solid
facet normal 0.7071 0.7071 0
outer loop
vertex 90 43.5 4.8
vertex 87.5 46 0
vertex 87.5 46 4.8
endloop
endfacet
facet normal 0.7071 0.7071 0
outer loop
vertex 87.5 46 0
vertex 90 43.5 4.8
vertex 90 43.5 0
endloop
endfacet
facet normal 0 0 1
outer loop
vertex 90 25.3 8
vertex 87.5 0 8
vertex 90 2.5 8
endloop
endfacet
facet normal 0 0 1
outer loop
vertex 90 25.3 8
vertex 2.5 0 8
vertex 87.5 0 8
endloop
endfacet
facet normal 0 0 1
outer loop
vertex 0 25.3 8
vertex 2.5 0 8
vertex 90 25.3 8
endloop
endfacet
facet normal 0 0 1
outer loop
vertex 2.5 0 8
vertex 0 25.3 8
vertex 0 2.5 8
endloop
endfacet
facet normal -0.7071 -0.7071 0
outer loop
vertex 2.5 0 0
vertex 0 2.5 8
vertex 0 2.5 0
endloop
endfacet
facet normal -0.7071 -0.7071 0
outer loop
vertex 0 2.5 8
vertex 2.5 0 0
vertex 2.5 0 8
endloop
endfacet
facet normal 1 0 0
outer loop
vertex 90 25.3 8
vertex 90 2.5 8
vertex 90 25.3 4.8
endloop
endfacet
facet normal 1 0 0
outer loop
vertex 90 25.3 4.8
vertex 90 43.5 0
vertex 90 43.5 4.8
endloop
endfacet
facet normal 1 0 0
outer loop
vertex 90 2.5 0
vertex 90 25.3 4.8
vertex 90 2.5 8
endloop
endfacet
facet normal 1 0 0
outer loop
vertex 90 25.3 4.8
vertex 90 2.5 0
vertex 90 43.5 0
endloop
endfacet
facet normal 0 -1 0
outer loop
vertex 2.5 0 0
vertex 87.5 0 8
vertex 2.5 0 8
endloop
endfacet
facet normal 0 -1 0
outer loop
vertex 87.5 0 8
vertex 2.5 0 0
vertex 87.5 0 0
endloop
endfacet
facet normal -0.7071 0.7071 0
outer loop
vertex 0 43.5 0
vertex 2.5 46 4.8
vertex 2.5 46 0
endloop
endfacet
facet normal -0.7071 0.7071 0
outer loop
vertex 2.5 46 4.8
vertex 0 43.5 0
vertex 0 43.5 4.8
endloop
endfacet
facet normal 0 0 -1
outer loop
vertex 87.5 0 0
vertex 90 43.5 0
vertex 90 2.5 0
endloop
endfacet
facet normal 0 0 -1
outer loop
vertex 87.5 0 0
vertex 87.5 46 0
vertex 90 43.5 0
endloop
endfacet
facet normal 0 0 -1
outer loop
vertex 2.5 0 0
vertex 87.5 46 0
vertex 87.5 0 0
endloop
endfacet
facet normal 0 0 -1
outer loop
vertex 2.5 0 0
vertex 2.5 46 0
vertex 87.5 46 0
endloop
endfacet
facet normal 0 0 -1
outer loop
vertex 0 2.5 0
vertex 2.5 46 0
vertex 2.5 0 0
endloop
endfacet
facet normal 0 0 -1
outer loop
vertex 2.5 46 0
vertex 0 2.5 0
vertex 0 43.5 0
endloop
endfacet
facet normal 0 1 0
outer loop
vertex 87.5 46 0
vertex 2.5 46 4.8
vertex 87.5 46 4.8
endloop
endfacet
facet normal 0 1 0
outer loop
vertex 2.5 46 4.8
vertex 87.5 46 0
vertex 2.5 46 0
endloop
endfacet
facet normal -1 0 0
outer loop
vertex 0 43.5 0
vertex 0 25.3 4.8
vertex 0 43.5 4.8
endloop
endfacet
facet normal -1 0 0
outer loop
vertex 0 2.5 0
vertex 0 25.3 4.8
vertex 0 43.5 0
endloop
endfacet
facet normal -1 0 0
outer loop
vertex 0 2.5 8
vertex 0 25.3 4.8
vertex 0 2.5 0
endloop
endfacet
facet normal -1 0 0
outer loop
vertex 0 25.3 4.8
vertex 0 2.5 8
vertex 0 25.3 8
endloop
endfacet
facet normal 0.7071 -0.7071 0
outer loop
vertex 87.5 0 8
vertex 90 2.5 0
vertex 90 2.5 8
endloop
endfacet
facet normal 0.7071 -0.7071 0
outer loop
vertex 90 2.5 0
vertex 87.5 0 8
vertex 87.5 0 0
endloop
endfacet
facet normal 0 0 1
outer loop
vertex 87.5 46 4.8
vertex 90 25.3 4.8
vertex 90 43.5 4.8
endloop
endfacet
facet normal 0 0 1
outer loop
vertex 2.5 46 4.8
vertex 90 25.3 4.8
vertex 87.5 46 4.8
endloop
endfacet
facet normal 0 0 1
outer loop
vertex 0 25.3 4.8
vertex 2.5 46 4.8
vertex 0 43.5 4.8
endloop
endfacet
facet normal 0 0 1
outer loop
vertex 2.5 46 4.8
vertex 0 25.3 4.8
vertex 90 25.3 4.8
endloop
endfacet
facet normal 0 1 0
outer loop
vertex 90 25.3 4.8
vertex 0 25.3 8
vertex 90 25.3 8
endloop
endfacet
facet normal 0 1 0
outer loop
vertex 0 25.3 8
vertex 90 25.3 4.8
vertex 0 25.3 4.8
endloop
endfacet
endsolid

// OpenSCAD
$fn = 32;

// ----------------------------------------------------------------------
// Stepped bar: sidestep, 90 x 46 x 8/4.8 mm
// ----------------------------------------------------------------------

// --- parameters (mm) ---
bar_l = 90;               // bar length, X
bar_w = 46;               // bar width, Y
plate_t = 8;              // thickness of the thick zone, Z
thin_t = 4.8;             // thickness of the thin zone
corner_c = 2.5;           // corner chamfer of the bar
step_cut = 3.2;           // material removed from the thin zone
ledge_y = 25.3;           // start of the ledge from the front edge
depth_1 = 3.2;            // depth of cut 1 from the top face

profile = [[2.5, 0], [87.5, 0], [90, 2.5], [90, 43.5], [87.5, 46], [2.5, 46], [0, 43.5], [0, 2.5]];  // primary outline, 8 points, counter clockwise
void_1 = [[-1, 25.3], [91, 25.3], [91, 47], [-1, 47]];  // ledge cut along one edge, 4 points

// --- the one profile operation ---
difference() {
  linear_extrude(height = plate_t) polygon(points = profile);
  translate([0, 0, plate_t - depth_1])
    linear_extrude(height = depth_1 + 1) polygon(points = void_1);
}
